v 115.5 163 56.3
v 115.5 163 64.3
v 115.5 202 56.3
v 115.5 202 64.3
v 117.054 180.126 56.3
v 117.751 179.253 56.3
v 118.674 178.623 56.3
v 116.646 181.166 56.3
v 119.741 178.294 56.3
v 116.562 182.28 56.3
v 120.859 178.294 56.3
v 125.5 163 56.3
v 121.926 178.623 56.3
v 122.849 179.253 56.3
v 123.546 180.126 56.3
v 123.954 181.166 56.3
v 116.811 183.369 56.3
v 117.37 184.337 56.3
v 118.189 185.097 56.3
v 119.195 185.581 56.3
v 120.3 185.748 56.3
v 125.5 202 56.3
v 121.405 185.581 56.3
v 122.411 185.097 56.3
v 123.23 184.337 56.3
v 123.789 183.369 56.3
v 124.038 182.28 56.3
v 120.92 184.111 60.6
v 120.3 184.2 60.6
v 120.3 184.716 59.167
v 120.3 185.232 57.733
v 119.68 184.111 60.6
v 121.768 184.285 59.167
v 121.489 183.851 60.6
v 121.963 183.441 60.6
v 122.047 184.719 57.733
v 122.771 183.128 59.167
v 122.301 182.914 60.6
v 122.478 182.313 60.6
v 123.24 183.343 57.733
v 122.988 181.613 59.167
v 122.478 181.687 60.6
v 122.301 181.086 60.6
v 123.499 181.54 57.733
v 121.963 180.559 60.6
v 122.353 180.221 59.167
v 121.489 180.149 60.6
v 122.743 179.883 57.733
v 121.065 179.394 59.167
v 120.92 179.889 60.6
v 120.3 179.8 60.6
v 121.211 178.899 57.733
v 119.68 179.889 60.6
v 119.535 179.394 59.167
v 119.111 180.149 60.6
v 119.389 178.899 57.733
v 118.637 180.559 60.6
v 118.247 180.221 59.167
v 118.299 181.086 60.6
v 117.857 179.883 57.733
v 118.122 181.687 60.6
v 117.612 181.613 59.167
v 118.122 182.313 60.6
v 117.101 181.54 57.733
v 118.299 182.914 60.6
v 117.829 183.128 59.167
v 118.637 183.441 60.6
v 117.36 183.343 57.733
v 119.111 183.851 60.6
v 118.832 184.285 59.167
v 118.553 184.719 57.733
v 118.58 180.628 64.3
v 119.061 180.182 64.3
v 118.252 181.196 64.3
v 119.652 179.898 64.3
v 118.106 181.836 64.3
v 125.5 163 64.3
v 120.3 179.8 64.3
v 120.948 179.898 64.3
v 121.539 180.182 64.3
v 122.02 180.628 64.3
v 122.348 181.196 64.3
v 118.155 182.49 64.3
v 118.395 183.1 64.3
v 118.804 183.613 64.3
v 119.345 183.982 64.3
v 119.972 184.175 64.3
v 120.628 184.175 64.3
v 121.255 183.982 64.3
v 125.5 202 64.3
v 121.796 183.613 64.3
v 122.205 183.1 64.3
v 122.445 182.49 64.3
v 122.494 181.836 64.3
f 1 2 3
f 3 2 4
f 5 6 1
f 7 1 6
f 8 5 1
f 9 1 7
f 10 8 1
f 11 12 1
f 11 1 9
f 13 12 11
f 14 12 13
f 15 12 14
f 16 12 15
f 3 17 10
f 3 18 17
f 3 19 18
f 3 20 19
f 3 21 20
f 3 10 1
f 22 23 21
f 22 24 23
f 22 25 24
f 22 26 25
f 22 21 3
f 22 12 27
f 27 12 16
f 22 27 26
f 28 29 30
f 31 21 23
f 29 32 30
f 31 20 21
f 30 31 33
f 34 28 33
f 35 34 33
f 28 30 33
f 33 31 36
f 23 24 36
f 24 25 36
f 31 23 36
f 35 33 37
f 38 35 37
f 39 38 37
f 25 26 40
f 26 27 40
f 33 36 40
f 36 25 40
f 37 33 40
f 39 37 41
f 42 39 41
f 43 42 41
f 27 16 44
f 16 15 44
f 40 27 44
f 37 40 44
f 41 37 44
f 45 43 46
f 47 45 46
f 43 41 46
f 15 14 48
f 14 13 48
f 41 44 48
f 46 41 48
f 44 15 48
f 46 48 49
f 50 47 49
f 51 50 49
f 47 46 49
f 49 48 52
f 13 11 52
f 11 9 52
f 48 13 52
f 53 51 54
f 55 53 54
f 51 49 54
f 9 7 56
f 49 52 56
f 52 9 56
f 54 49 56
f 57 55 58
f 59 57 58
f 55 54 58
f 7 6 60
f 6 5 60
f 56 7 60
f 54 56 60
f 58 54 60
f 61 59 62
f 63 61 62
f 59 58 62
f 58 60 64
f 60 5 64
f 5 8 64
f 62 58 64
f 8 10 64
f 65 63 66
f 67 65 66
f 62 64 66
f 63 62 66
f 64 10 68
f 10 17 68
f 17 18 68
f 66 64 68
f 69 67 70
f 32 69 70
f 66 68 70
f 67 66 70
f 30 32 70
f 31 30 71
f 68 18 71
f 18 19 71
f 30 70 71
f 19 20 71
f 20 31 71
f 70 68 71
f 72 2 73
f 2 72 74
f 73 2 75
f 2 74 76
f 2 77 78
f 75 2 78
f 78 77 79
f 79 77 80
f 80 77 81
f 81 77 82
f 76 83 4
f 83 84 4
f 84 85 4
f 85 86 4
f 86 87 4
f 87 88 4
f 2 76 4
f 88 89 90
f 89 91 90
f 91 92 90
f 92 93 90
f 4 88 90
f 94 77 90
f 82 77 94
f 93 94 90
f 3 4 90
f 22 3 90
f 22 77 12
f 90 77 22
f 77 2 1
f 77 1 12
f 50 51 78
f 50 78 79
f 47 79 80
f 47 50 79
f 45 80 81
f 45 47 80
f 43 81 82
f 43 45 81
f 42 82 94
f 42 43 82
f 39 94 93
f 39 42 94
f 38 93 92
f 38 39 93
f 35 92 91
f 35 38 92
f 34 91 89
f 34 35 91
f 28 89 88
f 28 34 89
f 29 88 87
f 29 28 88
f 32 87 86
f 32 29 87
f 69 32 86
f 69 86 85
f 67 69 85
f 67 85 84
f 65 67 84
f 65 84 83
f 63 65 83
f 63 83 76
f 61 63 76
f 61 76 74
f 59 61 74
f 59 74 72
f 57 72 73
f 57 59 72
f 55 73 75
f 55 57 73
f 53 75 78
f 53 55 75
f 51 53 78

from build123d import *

# Parameters (mm, degrees)
CYLINDER156_R             = 2.2
CYLINDER156_DEPTH         = 50
FUSION076_PLACEMENT_ANGLE = 90
BOX068_W                  = 39
BOX068_H                  = 10
BOX068_DEPTH              = 8
CUT144_ROLL_ANGLE         = 180
CUT144_PLACEMENT_ANGLE    = 90


with BuildPart() as cylinder156:
    # Cylinder156 → Cylinder156 (new body)
    with BuildSketch(Plane(origin=(-24, 26, -8), x_dir=(0, 0, -1), z_dir=(1, 0, 0))):
        Circle(CYLINDER156_R)
    extrude(amount=CYLINDER156_DEPTH)


with BuildPart() as fusion076:
    # Cone018 → Cone018 (revolve)
    with BuildSketch(Plane(origin=(-24, 26, -8), x_dir=(0, 0, 1), z_dir=(0, -1, 0))):
        Polygon((0, 0), (2.2, 0), (4, 5), (0, 5), align=None)
    revolve(axis=Axis((-24, 26, -8), (-1, 0, 0)))

    # Fusion076: union Cylinder156
    add(cylinder156.part)


with BuildPart() as fusion076_1:
    # Fusion076 placement: moved
    add(fusion076.part.moved(Location((111.8, -1.7, 18.4))).rotate(Axis((111.8, -1.7, 18.4), (0, 1, 0)), FUSION076_PLACEMENT_ANGLE))


with BuildPart() as cut144:
    # Box068 → Box068 (new body)
    with BuildSketch(Plane(origin=(84.8, 19.5, 38.7), x_dir=(1, 0, 0), z_dir=(0, 0, 1))):
        with Locations((19.5, 5)):
            Rectangle(BOX068_W, BOX068_H)
    extrude(amount=BOX068_DEPTH)

    # Cut144: cut Fusion076
    add(fusion076_1.part, mode=Mode.SUBTRACT)


with BuildPart() as cut144_1:
    # Cut144 roll: moved
    add(cut144.part.rotate(Axis((0, 0, 0), (1, 0, 0)), CUT144_ROLL_ANGLE))


with BuildPart() as cut144_2:
    # Cut144 placement: moved
    add(cut144_1.part.moved(Location((96, 78.2, 103))).rotate(Axis((96, 78.2, 103), (0, 0, 1)), CUT144_PLACEMENT_ANGLE))


solid = cut144_2.part
